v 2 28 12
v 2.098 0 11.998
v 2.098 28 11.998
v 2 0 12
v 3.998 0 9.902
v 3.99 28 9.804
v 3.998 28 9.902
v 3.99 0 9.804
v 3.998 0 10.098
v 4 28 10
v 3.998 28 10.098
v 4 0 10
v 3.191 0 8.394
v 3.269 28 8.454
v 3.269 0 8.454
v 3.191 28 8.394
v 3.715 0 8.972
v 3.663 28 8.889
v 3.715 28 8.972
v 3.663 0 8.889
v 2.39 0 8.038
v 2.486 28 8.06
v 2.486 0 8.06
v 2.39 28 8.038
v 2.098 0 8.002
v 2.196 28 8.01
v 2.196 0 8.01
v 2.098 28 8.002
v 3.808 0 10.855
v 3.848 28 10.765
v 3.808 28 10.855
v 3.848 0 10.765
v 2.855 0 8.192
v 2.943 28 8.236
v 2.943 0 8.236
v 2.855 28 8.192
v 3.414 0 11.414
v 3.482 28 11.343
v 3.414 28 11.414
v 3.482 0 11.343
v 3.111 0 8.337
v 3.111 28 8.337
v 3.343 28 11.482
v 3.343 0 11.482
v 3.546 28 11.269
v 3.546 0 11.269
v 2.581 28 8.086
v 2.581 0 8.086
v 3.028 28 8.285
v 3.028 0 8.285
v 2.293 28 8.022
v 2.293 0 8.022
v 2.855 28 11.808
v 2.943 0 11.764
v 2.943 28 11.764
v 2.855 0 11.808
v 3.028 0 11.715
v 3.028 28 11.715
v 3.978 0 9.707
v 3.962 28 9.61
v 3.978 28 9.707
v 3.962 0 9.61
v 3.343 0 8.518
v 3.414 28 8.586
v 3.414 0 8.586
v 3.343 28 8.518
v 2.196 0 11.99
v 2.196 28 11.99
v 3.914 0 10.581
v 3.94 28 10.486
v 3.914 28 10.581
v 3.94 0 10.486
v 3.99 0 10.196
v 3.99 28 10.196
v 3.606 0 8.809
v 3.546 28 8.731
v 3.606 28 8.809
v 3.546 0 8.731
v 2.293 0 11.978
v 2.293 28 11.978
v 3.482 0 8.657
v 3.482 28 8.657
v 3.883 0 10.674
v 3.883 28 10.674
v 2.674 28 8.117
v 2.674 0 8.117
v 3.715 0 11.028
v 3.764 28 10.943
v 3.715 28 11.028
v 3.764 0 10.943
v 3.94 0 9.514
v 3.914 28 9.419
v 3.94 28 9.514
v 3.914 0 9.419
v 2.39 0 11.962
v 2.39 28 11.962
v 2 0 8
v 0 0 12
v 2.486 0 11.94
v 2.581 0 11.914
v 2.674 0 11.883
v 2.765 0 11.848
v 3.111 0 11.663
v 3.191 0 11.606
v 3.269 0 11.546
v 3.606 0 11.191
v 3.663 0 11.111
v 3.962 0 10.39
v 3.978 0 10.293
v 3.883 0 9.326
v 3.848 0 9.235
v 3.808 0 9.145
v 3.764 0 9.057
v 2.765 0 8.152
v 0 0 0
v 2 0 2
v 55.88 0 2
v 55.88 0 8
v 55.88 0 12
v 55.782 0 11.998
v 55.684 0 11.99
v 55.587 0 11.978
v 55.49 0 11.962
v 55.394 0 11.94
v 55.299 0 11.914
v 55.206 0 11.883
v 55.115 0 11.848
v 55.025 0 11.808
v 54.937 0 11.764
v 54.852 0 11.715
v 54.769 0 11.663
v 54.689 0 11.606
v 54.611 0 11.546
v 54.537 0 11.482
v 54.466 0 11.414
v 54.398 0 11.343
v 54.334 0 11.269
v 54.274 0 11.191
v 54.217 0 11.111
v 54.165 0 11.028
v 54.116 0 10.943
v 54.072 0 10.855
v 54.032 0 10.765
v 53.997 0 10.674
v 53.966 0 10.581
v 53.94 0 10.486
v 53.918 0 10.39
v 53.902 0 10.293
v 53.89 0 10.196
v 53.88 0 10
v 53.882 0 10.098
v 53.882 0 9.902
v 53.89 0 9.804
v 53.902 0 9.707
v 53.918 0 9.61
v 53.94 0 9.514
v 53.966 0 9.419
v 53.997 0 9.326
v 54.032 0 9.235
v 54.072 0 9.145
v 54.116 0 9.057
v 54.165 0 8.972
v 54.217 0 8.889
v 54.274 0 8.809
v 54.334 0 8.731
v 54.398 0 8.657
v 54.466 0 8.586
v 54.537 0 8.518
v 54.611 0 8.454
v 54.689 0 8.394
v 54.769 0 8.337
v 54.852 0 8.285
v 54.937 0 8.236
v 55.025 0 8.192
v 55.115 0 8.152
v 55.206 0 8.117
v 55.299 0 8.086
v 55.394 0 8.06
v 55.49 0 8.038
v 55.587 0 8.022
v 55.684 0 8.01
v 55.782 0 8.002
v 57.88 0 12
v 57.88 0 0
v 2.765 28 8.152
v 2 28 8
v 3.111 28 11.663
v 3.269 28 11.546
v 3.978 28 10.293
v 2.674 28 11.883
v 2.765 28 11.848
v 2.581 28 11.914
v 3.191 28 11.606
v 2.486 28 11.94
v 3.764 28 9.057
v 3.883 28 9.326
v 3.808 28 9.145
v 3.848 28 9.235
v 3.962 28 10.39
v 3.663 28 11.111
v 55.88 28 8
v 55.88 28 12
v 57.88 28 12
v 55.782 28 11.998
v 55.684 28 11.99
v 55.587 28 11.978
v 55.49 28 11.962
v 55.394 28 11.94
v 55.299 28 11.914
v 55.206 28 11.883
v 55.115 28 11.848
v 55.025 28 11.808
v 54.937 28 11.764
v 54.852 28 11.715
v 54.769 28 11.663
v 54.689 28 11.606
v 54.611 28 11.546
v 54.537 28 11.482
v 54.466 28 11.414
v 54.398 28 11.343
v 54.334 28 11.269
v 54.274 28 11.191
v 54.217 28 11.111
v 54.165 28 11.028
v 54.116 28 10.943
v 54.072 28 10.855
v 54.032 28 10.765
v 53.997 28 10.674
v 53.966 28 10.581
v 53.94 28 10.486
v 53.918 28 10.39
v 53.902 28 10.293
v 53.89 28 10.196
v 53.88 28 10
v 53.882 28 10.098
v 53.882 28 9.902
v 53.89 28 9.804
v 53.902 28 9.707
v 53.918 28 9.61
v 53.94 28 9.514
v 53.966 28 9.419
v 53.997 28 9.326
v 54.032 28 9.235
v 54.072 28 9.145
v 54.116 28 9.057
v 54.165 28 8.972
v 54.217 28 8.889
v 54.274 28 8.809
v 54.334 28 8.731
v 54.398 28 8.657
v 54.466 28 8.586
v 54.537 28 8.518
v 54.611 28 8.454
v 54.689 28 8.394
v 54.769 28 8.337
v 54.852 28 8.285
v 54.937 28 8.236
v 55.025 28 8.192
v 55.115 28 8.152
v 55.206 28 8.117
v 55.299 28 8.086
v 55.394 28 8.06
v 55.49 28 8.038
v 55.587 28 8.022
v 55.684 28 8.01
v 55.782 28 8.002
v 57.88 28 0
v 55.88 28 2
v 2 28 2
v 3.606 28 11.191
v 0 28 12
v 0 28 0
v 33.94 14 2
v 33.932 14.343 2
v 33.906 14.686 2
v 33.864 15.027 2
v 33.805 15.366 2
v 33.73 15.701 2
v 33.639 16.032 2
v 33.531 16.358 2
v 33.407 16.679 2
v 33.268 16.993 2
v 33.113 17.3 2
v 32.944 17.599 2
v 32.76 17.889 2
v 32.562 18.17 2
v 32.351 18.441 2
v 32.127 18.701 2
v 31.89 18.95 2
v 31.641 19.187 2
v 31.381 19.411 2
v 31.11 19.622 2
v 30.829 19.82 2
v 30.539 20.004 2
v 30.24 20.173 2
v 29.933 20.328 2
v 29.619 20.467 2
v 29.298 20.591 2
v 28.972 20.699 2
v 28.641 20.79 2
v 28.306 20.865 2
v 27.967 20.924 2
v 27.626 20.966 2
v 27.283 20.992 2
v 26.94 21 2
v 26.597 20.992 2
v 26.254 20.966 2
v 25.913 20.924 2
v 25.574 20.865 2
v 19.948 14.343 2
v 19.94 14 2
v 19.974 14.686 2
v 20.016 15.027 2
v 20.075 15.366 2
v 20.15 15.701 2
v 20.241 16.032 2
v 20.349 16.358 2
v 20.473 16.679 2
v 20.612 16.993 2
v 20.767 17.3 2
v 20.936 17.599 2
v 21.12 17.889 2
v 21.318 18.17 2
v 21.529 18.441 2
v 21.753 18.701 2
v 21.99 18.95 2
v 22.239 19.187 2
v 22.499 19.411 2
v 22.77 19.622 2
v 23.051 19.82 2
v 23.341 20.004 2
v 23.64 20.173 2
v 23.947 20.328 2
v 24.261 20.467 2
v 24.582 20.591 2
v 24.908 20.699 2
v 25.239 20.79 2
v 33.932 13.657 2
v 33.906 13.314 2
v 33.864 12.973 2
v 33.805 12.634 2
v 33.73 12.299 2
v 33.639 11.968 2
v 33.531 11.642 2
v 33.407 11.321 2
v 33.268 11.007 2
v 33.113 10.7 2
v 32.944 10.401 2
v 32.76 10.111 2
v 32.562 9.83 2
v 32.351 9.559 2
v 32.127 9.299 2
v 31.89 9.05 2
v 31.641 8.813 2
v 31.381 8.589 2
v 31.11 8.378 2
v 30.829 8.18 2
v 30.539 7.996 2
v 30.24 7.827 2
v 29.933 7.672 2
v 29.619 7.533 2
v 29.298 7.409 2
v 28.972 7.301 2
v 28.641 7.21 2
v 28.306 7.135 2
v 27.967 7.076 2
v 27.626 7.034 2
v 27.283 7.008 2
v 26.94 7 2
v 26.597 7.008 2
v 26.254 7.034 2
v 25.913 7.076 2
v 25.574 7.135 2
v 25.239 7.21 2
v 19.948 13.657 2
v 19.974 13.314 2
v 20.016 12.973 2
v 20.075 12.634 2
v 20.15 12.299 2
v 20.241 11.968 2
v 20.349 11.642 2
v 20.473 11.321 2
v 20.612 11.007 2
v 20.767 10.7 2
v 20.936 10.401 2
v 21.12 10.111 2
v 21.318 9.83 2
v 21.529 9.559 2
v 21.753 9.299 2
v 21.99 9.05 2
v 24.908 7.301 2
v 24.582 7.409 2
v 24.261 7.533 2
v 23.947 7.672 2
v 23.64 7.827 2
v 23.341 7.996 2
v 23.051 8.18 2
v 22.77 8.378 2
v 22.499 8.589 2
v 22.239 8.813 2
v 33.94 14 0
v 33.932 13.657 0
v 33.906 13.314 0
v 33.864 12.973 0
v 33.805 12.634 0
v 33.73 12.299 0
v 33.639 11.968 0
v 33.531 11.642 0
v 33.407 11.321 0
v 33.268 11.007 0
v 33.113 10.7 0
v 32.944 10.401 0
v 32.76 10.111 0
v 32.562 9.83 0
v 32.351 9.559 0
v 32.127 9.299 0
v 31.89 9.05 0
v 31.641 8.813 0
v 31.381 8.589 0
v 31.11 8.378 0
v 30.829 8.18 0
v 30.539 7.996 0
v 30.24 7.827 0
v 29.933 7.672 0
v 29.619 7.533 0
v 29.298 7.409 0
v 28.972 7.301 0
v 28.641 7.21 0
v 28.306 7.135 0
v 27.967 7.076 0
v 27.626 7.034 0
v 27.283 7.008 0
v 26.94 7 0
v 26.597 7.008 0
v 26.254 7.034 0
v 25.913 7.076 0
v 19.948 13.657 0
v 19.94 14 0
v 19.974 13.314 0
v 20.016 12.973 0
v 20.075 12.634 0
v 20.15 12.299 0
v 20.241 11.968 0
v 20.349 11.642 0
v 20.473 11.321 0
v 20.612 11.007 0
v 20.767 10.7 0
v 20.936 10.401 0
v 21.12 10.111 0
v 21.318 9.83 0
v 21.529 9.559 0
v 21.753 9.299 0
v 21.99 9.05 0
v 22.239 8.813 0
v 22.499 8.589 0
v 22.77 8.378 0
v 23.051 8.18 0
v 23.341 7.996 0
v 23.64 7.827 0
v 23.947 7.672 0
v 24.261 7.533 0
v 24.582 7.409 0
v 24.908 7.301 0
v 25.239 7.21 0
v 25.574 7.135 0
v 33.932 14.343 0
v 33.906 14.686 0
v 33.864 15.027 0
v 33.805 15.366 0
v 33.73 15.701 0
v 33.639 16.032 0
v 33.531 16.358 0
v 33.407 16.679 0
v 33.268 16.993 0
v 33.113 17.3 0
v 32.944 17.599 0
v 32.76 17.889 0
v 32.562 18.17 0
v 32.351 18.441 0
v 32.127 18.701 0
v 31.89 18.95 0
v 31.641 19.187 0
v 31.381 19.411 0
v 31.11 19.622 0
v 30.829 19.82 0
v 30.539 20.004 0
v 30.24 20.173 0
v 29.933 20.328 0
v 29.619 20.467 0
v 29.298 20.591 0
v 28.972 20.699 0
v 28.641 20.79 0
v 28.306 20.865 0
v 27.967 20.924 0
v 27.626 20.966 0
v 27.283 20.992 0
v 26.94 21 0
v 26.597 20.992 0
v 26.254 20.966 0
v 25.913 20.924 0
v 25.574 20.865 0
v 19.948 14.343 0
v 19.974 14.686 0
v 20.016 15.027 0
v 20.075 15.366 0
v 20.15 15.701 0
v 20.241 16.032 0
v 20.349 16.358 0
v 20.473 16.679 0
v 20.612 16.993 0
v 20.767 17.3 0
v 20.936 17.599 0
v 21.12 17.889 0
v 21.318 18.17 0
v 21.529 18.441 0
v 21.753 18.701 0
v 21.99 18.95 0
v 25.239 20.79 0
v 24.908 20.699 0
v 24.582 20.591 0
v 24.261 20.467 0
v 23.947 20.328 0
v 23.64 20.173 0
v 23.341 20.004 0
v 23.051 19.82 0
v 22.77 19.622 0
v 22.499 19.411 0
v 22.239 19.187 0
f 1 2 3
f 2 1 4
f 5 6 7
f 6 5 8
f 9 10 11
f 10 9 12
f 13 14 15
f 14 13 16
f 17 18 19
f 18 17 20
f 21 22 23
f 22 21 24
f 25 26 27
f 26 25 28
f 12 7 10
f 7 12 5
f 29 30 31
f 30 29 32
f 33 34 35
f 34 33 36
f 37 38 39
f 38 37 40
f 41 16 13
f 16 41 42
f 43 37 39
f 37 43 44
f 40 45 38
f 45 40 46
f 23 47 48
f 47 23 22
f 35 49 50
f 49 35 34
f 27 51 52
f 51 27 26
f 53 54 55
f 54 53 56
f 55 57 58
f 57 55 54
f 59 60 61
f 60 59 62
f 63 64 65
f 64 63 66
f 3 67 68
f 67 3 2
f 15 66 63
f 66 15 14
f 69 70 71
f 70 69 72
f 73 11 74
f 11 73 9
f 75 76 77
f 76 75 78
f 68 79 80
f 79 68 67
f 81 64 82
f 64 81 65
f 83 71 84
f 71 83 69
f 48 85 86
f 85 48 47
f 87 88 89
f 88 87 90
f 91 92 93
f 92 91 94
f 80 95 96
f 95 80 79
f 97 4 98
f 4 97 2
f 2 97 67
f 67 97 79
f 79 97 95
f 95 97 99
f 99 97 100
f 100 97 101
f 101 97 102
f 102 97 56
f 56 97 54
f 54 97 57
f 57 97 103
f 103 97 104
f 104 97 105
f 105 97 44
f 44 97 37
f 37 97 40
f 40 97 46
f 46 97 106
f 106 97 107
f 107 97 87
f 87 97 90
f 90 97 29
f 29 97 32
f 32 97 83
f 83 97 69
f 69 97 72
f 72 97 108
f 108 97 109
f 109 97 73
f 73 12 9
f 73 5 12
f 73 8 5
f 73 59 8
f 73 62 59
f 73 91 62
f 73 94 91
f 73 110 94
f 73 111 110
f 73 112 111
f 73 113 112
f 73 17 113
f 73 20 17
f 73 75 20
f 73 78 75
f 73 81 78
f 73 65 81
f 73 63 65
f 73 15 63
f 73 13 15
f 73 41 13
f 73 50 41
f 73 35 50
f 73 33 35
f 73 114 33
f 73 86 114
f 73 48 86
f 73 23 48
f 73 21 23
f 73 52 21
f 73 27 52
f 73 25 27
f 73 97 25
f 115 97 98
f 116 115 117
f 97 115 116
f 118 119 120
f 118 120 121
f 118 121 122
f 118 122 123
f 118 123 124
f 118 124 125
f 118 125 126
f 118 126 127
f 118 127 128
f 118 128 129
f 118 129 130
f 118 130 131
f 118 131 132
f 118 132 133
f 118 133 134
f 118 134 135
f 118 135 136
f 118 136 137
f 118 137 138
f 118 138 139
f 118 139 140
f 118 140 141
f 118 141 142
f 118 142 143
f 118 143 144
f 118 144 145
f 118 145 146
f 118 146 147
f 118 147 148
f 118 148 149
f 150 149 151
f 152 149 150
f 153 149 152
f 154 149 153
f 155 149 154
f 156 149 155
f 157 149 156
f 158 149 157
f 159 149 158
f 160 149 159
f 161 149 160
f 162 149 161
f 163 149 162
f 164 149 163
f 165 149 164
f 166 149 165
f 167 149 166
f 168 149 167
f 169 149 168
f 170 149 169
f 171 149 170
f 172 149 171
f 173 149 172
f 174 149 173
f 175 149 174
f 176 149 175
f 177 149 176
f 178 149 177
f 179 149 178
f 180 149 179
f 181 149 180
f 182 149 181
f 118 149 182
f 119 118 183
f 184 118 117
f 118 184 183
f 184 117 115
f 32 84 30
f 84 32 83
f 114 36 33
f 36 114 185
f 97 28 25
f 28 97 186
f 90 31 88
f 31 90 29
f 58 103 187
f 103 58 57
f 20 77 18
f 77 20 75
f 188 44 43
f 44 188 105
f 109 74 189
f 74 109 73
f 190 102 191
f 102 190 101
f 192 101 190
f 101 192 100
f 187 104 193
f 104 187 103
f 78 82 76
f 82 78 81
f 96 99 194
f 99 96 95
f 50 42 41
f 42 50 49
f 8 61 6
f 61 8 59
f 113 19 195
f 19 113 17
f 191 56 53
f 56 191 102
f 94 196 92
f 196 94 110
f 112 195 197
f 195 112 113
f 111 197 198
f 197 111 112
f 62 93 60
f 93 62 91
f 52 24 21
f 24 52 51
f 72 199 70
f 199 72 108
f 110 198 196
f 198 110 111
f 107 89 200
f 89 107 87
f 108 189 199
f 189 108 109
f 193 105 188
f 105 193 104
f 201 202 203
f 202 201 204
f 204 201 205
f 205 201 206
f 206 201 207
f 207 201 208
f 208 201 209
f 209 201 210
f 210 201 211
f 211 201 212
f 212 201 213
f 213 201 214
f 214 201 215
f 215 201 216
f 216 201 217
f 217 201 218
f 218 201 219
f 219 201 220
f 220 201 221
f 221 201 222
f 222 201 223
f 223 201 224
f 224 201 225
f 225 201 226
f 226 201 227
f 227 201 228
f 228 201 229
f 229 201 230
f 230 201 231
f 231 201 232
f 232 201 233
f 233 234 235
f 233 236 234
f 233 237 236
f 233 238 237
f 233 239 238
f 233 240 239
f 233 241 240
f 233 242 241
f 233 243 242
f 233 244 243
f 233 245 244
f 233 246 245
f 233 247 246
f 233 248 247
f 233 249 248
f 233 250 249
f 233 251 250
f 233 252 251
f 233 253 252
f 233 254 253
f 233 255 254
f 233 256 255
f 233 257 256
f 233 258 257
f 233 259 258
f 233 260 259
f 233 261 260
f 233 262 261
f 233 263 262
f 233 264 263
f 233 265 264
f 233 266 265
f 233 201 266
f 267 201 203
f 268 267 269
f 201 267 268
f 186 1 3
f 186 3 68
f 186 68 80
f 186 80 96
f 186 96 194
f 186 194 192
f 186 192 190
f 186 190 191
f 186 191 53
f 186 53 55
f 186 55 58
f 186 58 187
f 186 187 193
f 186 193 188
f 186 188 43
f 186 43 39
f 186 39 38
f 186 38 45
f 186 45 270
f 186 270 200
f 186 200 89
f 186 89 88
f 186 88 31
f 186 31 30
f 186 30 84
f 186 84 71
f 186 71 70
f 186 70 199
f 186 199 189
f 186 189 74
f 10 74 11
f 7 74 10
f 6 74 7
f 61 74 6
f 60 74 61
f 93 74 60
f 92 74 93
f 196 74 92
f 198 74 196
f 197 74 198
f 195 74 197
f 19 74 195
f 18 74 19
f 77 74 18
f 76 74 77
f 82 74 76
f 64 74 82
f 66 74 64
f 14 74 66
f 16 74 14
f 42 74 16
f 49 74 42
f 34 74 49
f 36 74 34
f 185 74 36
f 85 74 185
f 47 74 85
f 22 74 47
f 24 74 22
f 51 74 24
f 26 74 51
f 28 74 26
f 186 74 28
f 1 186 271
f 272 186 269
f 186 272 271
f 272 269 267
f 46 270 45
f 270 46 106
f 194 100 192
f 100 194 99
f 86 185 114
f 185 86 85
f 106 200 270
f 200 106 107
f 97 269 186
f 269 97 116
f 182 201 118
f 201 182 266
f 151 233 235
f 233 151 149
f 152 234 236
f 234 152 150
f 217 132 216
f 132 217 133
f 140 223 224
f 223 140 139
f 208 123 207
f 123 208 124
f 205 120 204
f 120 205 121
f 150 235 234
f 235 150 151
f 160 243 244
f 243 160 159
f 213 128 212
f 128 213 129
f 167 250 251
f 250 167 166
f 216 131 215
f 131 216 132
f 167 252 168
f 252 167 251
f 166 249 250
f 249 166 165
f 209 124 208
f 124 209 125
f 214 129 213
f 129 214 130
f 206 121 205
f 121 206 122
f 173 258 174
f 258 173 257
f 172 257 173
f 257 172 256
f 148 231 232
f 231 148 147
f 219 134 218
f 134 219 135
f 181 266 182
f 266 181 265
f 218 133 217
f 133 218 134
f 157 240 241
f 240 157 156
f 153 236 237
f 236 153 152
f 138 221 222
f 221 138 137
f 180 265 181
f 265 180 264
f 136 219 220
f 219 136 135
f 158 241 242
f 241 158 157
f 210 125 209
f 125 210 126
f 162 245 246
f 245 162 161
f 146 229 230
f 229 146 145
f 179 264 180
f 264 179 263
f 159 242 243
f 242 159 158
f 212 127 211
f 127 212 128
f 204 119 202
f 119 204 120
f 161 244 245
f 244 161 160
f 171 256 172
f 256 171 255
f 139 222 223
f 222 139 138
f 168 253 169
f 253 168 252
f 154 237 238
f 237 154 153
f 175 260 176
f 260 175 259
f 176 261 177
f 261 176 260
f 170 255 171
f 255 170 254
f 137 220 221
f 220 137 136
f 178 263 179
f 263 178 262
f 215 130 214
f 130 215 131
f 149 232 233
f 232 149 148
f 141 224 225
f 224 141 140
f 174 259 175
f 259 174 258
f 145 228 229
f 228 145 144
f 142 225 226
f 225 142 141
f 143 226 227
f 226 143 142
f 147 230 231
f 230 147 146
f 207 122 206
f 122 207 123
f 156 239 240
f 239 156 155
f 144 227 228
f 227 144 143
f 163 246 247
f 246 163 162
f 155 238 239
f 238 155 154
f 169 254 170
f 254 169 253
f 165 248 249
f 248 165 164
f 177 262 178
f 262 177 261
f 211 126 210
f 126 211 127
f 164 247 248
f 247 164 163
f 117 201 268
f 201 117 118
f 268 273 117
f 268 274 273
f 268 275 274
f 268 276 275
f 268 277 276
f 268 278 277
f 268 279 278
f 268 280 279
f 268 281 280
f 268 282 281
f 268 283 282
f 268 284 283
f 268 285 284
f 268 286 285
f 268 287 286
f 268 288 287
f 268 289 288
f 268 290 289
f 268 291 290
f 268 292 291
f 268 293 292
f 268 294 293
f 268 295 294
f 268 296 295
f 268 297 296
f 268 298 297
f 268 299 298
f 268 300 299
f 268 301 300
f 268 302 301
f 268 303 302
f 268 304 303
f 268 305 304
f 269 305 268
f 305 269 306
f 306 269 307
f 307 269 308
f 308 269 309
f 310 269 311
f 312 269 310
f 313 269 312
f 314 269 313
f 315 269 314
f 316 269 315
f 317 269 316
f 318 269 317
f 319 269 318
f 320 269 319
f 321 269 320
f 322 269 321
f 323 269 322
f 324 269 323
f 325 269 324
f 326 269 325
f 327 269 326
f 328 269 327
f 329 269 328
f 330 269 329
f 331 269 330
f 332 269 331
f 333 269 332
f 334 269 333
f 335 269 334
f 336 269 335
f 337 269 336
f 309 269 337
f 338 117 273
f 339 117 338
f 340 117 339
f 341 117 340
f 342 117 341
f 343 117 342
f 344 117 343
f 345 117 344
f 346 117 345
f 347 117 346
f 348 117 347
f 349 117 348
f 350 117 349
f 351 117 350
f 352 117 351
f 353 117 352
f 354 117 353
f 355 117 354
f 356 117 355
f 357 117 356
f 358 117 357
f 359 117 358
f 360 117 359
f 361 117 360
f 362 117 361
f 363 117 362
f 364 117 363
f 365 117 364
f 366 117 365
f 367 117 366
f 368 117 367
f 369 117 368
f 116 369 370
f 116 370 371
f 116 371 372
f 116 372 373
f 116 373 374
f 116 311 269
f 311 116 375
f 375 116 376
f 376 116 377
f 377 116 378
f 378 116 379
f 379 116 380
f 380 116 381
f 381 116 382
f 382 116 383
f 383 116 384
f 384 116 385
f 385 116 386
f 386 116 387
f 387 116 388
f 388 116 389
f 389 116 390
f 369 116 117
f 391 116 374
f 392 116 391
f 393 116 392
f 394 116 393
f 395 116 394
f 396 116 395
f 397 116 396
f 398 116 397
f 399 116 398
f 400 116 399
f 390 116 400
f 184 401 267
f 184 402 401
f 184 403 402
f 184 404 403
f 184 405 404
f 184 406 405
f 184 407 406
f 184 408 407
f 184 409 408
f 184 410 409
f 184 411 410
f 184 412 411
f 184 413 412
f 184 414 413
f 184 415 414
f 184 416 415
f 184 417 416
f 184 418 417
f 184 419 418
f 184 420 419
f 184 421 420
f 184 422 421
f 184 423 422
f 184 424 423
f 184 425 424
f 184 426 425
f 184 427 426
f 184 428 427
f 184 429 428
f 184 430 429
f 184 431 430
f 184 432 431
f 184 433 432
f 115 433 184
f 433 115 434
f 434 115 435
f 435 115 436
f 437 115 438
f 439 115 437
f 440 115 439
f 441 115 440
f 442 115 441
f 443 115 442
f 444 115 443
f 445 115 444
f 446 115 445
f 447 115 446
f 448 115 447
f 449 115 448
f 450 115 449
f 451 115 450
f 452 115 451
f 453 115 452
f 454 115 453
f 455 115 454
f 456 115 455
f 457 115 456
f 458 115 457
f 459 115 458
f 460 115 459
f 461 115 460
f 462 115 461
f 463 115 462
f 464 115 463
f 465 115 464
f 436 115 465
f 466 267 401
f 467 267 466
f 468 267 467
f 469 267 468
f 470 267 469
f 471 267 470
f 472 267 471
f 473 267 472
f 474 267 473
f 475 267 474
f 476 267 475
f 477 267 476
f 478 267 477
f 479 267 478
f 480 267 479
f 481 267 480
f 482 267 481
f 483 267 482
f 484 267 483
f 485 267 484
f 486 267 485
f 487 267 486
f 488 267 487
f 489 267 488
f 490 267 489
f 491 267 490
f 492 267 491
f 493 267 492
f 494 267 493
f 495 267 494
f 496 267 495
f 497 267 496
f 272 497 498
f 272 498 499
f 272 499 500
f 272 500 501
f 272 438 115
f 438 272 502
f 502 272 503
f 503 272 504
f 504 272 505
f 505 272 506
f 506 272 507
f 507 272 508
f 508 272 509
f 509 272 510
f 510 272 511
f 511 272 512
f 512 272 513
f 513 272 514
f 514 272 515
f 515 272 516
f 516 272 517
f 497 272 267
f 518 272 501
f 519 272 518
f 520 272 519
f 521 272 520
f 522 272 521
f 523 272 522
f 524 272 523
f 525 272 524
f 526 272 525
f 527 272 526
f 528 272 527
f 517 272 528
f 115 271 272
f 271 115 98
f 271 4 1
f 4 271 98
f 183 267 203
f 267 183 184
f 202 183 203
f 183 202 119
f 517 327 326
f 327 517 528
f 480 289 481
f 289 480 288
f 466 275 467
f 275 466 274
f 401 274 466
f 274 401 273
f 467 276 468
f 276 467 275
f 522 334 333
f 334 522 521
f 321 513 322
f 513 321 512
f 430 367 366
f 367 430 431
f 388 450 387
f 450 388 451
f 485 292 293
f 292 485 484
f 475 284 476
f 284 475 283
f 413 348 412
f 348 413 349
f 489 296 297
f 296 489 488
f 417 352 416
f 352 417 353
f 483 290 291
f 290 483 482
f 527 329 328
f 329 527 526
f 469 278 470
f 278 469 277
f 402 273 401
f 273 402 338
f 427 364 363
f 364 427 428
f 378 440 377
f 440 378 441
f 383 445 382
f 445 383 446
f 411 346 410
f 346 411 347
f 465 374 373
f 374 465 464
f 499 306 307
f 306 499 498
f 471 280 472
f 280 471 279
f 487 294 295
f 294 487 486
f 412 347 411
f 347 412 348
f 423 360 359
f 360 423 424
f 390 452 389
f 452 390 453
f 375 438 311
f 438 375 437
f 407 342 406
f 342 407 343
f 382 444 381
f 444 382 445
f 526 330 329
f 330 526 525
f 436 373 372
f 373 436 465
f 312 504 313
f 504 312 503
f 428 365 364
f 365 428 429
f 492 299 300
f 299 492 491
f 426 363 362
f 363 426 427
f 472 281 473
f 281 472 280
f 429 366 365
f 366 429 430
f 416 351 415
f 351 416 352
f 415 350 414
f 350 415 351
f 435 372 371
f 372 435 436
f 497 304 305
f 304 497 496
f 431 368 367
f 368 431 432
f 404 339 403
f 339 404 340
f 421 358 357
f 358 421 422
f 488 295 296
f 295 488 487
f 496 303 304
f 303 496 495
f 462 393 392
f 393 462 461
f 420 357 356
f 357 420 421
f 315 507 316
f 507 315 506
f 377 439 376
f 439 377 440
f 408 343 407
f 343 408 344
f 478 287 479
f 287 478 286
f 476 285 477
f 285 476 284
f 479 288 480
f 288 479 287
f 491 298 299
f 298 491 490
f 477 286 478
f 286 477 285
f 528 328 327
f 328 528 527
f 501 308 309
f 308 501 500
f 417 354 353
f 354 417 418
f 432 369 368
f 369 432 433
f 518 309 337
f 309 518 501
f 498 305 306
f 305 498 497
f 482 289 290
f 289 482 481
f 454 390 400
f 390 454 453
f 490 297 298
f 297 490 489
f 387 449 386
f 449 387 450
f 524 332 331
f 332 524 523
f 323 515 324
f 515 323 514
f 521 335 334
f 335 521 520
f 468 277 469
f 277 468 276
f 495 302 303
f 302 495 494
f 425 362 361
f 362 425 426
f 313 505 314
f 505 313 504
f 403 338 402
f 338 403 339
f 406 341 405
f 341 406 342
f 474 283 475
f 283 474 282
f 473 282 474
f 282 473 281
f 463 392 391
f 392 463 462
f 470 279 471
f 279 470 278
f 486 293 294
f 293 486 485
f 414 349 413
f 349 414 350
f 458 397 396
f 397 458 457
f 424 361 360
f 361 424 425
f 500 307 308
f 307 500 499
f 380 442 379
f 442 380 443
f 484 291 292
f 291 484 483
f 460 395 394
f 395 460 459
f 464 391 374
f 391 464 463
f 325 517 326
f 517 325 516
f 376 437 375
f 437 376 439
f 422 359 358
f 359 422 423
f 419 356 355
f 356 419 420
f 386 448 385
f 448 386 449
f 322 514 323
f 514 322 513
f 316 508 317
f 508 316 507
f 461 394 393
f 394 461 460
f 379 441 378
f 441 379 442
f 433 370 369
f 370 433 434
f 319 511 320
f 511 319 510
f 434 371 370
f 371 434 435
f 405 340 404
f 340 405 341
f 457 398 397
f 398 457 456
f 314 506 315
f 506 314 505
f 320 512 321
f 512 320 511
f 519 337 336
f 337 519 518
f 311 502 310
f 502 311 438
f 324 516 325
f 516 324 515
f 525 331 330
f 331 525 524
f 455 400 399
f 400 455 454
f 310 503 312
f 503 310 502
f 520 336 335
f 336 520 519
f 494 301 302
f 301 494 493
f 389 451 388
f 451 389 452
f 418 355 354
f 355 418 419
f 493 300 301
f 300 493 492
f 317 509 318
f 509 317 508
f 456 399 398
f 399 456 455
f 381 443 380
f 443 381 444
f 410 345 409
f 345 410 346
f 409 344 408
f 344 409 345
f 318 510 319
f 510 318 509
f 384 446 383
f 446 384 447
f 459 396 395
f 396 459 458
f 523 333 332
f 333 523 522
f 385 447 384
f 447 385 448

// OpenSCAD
/*
 * This clip is designed to fit on the filament spool supplied by Ultimaker
 * to stop it from uncoiling after being removed from the printer
 */

module Buffer(radius, width, fn)
{
    difference()
    {
        cylinder(r = radius, h = width, $fn = fn);

        translate([-width/4, 0, 0])
        cube([width/2, width/4, width]);
    }
}

module MainShape(spoolWidth, bracketWidth, overhangLength, overhangDepth, thickness, fn)
{
    spoolWidth = spoolWidth + thickness;

    cube([spoolWidth, bracketWidth, thickness]);

    cube([thickness, bracketWidth, overhangLength]);

    translate([spoolWidth, 0, 0])
    cube([thickness, bracketWidth, overhangLength]);

    rotate([0, 90, 90])
    translate([-overhangLength + overhangDepth, -thickness, 0])
    Buffer(overhangDepth, bracketWidth, fn);

    rotate([0, 270, 270])
    translate([overhangLength - overhangDepth, spoolWidth, 0])
    Buffer(overhangDepth, bracketWidth, fn);
}

module FilamentSpoolClip(spoolWidth = 53.88, bracketWidth = 28, overhangLength = 12, overhangDepth = 2, thickness = 2, holeRadius = 7, fn = 128)
{
    difference()
    {
        MainShape(spoolWidth, bracketWidth, overhangLength,
                  overhangDepth, thickness, fn);

        translate([spoolWidth / 2, bracketWidth / 2, 0])
        cylinder(r = holeRadius, thickness, $fn = fn);
    }
}

FilamentSpoolClip();
